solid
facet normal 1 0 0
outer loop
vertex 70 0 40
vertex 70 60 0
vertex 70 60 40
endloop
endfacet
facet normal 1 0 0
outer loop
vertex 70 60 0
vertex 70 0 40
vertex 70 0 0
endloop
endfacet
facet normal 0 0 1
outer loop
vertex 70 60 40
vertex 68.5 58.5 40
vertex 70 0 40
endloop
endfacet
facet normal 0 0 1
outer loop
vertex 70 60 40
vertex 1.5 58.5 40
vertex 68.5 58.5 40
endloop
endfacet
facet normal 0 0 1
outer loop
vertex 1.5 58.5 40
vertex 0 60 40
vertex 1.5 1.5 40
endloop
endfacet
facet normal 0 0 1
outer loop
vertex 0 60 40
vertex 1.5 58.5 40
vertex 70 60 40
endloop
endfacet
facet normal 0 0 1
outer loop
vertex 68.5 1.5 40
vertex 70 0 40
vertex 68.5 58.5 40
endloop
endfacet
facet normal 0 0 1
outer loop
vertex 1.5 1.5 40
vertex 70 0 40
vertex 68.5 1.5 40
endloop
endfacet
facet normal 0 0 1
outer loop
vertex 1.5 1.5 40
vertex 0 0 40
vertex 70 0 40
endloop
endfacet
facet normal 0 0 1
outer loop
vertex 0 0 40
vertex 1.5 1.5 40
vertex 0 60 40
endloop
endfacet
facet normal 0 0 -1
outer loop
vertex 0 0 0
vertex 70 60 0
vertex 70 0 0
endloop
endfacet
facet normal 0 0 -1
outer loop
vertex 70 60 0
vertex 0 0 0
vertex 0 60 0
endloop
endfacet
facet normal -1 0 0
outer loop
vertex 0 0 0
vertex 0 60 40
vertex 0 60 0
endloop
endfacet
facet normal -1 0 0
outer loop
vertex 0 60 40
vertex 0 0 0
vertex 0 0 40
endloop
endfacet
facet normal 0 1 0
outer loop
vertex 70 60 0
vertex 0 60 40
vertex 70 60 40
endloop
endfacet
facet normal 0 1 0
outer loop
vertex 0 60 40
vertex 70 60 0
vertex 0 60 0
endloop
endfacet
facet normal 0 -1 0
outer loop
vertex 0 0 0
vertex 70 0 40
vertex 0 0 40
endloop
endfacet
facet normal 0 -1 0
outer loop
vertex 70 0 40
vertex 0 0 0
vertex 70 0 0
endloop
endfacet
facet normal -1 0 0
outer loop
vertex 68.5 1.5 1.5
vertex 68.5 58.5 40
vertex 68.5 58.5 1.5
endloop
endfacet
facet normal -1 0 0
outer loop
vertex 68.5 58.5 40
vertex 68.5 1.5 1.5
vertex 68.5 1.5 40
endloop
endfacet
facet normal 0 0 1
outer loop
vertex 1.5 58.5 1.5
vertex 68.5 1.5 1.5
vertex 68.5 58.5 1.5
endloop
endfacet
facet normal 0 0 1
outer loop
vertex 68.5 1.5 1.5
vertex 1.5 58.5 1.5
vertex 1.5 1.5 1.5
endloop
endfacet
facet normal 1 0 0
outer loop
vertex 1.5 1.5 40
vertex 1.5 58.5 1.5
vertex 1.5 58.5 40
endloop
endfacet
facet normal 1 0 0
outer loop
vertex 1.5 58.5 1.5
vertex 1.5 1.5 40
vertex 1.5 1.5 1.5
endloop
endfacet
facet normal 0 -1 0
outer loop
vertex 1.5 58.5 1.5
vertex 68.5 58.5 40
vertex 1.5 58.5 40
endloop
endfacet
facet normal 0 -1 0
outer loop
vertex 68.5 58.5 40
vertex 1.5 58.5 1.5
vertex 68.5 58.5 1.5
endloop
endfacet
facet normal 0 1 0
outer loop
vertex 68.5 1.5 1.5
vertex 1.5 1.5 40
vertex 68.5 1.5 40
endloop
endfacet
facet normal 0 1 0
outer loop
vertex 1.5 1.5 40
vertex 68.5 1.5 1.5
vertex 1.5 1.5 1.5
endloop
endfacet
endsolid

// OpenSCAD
$fn = 32;

// ----------------------------------------------------------------------
// Open box: 1.5 mm walls
// ----------------------------------------------------------------------

// --- parameters (mm) ---
box_l = 70;               // outer length, X
box_w = 60;               // outer width, Y
box_h = 40;               // outer height, Z
wall = 1.5;               // wall thickness
floor = 1.5;              // floor thickness

difference() {
  cube([box_l, box_w, box_h]);
  translate([wall, wall, floor])
    cube([box_l - 2 * wall, box_w - 2 * wall, box_h]);
}
